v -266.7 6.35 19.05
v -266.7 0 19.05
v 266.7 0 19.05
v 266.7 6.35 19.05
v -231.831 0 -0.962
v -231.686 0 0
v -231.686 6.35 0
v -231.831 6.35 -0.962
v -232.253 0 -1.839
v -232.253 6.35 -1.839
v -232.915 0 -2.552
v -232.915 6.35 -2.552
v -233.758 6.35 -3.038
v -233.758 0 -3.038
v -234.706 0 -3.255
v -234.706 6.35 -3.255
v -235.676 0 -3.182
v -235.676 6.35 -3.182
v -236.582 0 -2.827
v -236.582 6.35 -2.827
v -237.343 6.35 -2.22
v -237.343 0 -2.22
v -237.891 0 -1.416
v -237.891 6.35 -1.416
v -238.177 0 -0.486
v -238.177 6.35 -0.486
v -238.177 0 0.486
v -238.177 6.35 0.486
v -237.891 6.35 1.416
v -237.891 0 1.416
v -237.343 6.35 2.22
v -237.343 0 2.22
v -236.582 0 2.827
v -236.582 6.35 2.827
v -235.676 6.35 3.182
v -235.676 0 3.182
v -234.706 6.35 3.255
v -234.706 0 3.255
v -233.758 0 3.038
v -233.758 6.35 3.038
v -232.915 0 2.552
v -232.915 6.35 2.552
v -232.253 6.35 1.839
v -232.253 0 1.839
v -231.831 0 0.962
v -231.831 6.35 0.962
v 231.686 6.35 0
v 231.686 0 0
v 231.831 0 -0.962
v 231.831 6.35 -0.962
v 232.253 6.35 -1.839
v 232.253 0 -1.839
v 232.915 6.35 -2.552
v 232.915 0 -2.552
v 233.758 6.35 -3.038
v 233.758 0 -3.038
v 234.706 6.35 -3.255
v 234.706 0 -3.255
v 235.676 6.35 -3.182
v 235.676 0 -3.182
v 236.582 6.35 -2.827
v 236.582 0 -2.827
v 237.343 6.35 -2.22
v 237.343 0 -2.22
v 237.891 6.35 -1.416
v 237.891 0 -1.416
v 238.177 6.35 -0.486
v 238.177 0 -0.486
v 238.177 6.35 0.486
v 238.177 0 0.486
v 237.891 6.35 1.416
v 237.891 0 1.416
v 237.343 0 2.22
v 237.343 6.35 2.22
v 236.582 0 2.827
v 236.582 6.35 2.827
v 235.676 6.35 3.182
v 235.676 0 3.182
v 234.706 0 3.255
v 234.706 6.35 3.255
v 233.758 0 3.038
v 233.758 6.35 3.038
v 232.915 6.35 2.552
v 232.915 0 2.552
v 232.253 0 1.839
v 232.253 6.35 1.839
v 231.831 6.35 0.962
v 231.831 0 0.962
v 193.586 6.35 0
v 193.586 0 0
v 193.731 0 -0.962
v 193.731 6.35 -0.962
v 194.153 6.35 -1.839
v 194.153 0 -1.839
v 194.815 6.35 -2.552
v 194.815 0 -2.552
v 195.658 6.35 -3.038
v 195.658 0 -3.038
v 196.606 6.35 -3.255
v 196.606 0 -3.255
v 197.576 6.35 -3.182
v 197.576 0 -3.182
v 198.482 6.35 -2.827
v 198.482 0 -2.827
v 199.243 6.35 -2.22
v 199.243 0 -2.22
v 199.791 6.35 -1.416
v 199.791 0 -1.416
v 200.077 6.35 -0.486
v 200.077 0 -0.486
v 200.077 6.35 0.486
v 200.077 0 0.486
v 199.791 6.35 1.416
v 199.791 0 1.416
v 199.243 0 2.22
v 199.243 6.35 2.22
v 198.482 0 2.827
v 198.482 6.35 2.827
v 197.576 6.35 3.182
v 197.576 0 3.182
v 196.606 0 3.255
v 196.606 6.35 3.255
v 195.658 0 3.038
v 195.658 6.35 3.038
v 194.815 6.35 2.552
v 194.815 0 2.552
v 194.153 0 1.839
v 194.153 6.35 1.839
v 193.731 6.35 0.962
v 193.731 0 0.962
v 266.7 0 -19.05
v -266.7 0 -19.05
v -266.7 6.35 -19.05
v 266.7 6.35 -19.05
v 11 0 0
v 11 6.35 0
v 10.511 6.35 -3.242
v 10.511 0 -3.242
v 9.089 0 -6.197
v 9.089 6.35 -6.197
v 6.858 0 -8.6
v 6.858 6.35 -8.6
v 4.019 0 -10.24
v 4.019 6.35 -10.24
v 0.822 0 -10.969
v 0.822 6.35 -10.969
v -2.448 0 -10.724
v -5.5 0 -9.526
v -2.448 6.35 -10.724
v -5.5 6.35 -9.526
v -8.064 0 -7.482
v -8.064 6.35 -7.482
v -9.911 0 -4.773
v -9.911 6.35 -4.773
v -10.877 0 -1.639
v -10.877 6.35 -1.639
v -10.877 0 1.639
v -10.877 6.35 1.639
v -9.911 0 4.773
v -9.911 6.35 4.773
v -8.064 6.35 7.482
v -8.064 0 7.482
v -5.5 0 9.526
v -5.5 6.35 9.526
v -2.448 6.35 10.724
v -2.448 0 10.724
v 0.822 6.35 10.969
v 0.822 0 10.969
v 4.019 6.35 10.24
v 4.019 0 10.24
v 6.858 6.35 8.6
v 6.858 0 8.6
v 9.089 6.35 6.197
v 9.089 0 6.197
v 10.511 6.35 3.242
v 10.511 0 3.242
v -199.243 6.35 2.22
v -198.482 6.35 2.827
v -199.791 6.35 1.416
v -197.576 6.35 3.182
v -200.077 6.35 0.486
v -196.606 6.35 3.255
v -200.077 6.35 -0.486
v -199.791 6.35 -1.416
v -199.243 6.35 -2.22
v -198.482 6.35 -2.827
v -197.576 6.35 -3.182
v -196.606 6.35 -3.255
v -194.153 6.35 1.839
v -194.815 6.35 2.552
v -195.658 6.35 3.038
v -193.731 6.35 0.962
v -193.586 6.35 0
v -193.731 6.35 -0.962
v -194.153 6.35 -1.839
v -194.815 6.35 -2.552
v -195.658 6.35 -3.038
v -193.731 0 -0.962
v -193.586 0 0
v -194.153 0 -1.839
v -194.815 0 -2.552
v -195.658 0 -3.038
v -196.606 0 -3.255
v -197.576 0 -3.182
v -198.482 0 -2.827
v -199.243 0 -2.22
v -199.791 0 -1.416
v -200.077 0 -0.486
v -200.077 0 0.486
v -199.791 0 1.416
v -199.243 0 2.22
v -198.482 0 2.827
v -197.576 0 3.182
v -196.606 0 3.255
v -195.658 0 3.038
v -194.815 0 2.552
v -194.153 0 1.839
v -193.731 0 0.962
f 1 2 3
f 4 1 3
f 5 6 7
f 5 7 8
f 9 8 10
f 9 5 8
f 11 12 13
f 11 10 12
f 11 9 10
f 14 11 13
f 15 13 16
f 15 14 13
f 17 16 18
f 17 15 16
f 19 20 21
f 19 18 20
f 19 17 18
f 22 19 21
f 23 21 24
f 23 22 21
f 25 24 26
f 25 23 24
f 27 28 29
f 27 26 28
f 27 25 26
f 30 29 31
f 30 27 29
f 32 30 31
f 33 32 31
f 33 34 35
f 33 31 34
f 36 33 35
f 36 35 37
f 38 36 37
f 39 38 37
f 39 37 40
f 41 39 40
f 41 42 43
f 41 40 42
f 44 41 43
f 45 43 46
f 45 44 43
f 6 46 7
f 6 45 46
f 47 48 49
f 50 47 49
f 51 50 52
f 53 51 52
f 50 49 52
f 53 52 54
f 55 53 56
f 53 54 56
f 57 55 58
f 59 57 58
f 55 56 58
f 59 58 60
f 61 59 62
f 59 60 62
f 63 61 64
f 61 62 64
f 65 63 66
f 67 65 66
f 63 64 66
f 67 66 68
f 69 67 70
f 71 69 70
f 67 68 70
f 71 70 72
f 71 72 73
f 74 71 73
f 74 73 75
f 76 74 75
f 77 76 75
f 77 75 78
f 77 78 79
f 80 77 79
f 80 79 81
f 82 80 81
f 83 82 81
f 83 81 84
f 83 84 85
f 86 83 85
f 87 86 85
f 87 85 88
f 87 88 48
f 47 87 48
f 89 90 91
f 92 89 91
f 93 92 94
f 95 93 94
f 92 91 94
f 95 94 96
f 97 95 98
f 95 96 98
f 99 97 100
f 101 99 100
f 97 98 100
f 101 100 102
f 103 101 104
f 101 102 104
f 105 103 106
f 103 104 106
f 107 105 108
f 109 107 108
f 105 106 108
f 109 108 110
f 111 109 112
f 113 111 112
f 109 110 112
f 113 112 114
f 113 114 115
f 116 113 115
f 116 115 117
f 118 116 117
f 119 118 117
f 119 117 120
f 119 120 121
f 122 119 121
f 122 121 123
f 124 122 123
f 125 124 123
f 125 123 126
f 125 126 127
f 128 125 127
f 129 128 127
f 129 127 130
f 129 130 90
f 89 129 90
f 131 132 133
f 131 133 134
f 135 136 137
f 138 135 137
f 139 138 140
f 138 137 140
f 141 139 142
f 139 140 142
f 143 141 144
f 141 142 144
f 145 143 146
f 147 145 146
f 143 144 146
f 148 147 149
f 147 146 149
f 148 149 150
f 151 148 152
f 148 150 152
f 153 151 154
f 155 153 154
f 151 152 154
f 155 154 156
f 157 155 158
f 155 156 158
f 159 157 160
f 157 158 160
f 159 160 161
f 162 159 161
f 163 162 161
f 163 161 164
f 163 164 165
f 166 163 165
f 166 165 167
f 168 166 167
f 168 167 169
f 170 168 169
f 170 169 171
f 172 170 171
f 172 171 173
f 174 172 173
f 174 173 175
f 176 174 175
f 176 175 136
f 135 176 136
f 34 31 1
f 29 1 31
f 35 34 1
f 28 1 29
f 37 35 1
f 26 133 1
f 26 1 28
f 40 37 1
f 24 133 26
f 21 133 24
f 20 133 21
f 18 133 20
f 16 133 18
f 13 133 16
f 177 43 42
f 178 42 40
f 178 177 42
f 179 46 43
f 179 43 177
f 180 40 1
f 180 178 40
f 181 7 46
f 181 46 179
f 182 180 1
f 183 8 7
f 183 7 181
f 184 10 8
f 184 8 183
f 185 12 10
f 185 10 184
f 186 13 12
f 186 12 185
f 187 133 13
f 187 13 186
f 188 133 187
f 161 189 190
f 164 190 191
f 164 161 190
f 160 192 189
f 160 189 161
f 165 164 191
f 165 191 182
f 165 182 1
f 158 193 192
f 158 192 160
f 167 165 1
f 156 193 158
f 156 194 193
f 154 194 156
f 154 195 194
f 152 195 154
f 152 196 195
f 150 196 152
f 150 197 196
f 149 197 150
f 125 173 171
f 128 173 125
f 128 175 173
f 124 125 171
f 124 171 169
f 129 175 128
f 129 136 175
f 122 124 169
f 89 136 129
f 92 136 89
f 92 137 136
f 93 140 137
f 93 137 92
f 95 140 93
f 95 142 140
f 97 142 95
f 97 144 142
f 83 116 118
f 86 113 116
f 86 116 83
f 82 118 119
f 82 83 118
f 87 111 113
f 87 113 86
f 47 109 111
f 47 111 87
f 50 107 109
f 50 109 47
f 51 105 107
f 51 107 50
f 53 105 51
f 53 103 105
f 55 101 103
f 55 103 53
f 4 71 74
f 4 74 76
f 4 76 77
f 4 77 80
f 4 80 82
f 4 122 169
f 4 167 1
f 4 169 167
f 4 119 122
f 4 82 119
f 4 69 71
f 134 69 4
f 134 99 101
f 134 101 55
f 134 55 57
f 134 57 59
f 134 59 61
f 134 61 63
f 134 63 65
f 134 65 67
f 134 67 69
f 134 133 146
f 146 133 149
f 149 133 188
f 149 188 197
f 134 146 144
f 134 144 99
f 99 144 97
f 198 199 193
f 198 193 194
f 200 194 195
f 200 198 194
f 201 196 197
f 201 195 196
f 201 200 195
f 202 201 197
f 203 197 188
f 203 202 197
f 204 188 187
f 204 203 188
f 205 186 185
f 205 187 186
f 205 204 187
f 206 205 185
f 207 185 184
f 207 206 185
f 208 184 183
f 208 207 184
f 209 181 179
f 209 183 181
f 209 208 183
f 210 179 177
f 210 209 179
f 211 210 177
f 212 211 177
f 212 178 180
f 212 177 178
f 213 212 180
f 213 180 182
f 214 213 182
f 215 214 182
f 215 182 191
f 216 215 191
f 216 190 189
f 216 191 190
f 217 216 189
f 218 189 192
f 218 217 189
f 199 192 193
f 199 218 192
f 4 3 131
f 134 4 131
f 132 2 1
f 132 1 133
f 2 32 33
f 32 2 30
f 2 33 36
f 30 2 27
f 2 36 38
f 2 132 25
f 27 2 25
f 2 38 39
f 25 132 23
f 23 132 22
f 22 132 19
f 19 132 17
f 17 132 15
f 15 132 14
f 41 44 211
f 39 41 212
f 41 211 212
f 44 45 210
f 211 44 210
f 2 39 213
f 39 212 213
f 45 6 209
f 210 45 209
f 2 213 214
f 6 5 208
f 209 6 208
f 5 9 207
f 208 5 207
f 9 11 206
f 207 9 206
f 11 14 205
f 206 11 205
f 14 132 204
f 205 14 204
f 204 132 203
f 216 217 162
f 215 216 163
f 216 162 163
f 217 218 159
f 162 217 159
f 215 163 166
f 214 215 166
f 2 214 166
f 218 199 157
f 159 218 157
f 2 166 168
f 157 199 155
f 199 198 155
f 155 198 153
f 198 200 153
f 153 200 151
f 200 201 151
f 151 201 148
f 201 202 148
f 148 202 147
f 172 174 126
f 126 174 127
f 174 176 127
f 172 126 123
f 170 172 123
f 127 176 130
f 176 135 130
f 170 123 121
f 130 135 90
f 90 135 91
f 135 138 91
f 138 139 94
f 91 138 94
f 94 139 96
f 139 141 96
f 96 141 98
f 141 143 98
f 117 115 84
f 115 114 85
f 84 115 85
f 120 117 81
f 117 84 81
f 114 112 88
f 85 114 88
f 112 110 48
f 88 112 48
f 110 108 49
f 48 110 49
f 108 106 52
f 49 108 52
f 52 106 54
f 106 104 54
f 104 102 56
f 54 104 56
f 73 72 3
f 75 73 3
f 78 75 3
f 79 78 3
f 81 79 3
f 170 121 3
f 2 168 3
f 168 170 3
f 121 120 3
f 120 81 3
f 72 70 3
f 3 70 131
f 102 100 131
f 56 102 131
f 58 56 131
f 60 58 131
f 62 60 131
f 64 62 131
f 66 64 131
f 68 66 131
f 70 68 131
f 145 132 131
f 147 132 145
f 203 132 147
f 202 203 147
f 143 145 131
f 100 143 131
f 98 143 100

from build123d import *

# Parameters (mm, degrees)
SKETCH1_W                = 533.4
SKETCH1_H                = 38.1
BOSS_EXTRUDE1_DEPTH      = 6.35
SKETCH2_R                = 11
CUT_EXTRUDE1_DEPTH       = 7.62
F_0_257_DIAMETER_HOLE1_D = 6.5278


with BuildPart() as part:
    # Sketch1 → Boss-Extrude1 (new body)
    with BuildSketch(Plane(origin=(0, 0, 0), x_dir=(1, 0, 0), z_dir=(0, 1, 0))):
        Rectangle(SKETCH1_W, SKETCH1_H)
    extrude(amount=BOSS_EXTRUDE1_DEPTH)

    # Sketch2 → Cut-Extrude1 (cut)
    with BuildSketch(Plane(origin=(0, 6.35, 0), x_dir=(1, 0, 0), z_dir=(0, 1, 0))):
        Circle(SKETCH2_R)
    extrude(amount=-CUT_EXTRUDE1_DEPTH, mode=Mode.SUBTRACT)

    # F (0.257) Diameter Hole1 (through all)
    with Locations(Plane(origin=(0, 6.35, 0), x_dir=(1, 0, 0), z_dir=(0, 1, 0))):
        with Locations((234.95, 0), (196.85, 0)):
            f_0_257_diameter_hole1 = Hole(F_0_257_DIAMETER_HOLE1_D / 2)

    # Mirror1: F (0.257) Diameter Hole1 across plane
    add(f_0_257_diameter_hole1.mirror(Plane(origin=(0, 0, 0), x_dir=(0, 0, 1), z_dir=(1, 0, 0))), mode=Mode.SUBTRACT)


solid = part.part
